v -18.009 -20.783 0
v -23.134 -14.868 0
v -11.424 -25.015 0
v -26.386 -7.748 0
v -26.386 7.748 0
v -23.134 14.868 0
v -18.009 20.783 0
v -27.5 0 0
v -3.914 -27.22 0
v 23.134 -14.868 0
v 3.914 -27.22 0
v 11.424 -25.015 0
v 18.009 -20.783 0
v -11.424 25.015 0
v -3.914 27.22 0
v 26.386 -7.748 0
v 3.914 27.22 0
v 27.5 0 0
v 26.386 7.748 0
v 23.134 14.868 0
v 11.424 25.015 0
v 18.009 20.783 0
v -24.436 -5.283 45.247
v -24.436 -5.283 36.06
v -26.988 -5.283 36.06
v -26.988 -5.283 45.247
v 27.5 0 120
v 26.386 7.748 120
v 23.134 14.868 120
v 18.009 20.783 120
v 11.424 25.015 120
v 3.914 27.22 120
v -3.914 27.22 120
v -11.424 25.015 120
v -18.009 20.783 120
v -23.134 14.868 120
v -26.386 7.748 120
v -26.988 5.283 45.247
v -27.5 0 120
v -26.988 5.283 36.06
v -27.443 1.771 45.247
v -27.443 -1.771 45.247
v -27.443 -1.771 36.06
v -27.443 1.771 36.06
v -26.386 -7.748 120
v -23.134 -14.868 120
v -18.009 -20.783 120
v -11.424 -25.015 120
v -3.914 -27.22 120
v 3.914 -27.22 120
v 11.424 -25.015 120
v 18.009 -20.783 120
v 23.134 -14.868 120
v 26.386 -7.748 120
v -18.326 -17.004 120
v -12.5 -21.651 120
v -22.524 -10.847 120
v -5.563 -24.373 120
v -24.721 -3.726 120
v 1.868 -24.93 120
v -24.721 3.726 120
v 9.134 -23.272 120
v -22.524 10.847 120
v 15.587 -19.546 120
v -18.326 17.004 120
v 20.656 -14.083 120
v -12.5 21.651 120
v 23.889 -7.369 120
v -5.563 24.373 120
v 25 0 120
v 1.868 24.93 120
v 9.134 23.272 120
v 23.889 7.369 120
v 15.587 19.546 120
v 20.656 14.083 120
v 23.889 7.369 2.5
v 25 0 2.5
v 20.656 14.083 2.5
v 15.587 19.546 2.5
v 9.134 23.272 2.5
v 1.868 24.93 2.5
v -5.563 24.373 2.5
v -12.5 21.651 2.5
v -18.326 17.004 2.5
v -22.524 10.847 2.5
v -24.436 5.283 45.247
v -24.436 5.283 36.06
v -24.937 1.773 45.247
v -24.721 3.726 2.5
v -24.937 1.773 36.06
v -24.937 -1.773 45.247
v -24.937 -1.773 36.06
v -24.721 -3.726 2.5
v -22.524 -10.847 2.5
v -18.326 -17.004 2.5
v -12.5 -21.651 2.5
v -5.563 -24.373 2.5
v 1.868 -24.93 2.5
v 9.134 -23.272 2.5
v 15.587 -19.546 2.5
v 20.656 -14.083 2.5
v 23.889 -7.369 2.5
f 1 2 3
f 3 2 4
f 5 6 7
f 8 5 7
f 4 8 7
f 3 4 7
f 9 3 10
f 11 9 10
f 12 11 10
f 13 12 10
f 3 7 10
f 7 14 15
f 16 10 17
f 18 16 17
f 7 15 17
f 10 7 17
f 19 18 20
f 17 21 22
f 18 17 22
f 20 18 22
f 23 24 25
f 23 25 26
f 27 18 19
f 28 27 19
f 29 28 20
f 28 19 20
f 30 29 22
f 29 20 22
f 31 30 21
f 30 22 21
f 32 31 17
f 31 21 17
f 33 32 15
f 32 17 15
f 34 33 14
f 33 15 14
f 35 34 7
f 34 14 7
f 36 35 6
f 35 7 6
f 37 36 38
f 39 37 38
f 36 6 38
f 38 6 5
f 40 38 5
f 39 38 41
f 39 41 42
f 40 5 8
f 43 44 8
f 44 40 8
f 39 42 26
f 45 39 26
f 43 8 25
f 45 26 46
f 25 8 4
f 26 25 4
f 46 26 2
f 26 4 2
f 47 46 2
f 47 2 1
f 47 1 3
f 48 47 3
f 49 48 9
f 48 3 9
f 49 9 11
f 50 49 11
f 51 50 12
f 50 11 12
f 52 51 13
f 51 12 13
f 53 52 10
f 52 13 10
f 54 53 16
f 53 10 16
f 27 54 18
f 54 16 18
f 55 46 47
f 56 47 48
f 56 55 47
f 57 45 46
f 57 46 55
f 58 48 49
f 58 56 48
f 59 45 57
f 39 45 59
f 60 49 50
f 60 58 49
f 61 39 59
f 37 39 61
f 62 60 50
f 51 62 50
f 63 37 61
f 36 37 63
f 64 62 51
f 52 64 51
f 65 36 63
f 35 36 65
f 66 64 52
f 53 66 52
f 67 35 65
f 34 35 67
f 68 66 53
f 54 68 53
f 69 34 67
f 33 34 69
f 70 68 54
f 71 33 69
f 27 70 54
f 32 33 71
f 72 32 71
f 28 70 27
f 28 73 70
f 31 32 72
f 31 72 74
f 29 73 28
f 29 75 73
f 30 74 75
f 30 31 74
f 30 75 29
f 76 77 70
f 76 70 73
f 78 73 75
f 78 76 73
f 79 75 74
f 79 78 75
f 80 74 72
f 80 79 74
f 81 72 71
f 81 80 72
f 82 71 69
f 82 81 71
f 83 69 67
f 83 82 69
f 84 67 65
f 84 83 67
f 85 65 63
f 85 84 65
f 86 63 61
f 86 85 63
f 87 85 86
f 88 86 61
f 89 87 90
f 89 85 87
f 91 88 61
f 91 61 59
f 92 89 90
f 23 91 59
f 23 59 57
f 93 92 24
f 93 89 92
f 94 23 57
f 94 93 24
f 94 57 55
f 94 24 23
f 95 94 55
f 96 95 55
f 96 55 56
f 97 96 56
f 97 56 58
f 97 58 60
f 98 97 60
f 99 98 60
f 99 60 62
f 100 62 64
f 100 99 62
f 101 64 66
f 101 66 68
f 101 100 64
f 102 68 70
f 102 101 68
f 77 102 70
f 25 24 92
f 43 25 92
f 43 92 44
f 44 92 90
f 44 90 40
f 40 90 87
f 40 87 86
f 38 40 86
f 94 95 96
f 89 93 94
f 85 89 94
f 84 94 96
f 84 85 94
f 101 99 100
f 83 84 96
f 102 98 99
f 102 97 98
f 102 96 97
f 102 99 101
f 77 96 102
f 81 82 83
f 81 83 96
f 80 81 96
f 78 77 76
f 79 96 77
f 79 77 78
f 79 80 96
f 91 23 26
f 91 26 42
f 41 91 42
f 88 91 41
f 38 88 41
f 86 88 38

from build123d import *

# Parameters (mm, degrees)
F0_R     = 27.5
F1_DEPTH = 120
F2_T     = -2.5
F3_W     = 10.565266
F3_H     = 9.187184
F4_DEPTH = 27.501


with BuildPart() as f1:
    # F0 (on Top) → F1 (new body)
    with BuildSketch(Plane.XY):
        Circle(F0_R)
    extrude(amount=F1_DEPTH)

    # F2
    f2_openings = [f1.faces().sort_by_distance(p)[0] for p in [
        (0, 0, 120),
    ]]
    offset(amount=F2_T, openings=f2_openings)

    # F3 (on Right) → F4 (cut, through all)
    with BuildSketch(Plane.YZ):
        with Locations((2e-06, 40.653296)):
            Rectangle(F3_W, F3_H)
    extrude(amount=-F4_DEPTH, mode=Mode.SUBTRACT)


solid = f1.part
